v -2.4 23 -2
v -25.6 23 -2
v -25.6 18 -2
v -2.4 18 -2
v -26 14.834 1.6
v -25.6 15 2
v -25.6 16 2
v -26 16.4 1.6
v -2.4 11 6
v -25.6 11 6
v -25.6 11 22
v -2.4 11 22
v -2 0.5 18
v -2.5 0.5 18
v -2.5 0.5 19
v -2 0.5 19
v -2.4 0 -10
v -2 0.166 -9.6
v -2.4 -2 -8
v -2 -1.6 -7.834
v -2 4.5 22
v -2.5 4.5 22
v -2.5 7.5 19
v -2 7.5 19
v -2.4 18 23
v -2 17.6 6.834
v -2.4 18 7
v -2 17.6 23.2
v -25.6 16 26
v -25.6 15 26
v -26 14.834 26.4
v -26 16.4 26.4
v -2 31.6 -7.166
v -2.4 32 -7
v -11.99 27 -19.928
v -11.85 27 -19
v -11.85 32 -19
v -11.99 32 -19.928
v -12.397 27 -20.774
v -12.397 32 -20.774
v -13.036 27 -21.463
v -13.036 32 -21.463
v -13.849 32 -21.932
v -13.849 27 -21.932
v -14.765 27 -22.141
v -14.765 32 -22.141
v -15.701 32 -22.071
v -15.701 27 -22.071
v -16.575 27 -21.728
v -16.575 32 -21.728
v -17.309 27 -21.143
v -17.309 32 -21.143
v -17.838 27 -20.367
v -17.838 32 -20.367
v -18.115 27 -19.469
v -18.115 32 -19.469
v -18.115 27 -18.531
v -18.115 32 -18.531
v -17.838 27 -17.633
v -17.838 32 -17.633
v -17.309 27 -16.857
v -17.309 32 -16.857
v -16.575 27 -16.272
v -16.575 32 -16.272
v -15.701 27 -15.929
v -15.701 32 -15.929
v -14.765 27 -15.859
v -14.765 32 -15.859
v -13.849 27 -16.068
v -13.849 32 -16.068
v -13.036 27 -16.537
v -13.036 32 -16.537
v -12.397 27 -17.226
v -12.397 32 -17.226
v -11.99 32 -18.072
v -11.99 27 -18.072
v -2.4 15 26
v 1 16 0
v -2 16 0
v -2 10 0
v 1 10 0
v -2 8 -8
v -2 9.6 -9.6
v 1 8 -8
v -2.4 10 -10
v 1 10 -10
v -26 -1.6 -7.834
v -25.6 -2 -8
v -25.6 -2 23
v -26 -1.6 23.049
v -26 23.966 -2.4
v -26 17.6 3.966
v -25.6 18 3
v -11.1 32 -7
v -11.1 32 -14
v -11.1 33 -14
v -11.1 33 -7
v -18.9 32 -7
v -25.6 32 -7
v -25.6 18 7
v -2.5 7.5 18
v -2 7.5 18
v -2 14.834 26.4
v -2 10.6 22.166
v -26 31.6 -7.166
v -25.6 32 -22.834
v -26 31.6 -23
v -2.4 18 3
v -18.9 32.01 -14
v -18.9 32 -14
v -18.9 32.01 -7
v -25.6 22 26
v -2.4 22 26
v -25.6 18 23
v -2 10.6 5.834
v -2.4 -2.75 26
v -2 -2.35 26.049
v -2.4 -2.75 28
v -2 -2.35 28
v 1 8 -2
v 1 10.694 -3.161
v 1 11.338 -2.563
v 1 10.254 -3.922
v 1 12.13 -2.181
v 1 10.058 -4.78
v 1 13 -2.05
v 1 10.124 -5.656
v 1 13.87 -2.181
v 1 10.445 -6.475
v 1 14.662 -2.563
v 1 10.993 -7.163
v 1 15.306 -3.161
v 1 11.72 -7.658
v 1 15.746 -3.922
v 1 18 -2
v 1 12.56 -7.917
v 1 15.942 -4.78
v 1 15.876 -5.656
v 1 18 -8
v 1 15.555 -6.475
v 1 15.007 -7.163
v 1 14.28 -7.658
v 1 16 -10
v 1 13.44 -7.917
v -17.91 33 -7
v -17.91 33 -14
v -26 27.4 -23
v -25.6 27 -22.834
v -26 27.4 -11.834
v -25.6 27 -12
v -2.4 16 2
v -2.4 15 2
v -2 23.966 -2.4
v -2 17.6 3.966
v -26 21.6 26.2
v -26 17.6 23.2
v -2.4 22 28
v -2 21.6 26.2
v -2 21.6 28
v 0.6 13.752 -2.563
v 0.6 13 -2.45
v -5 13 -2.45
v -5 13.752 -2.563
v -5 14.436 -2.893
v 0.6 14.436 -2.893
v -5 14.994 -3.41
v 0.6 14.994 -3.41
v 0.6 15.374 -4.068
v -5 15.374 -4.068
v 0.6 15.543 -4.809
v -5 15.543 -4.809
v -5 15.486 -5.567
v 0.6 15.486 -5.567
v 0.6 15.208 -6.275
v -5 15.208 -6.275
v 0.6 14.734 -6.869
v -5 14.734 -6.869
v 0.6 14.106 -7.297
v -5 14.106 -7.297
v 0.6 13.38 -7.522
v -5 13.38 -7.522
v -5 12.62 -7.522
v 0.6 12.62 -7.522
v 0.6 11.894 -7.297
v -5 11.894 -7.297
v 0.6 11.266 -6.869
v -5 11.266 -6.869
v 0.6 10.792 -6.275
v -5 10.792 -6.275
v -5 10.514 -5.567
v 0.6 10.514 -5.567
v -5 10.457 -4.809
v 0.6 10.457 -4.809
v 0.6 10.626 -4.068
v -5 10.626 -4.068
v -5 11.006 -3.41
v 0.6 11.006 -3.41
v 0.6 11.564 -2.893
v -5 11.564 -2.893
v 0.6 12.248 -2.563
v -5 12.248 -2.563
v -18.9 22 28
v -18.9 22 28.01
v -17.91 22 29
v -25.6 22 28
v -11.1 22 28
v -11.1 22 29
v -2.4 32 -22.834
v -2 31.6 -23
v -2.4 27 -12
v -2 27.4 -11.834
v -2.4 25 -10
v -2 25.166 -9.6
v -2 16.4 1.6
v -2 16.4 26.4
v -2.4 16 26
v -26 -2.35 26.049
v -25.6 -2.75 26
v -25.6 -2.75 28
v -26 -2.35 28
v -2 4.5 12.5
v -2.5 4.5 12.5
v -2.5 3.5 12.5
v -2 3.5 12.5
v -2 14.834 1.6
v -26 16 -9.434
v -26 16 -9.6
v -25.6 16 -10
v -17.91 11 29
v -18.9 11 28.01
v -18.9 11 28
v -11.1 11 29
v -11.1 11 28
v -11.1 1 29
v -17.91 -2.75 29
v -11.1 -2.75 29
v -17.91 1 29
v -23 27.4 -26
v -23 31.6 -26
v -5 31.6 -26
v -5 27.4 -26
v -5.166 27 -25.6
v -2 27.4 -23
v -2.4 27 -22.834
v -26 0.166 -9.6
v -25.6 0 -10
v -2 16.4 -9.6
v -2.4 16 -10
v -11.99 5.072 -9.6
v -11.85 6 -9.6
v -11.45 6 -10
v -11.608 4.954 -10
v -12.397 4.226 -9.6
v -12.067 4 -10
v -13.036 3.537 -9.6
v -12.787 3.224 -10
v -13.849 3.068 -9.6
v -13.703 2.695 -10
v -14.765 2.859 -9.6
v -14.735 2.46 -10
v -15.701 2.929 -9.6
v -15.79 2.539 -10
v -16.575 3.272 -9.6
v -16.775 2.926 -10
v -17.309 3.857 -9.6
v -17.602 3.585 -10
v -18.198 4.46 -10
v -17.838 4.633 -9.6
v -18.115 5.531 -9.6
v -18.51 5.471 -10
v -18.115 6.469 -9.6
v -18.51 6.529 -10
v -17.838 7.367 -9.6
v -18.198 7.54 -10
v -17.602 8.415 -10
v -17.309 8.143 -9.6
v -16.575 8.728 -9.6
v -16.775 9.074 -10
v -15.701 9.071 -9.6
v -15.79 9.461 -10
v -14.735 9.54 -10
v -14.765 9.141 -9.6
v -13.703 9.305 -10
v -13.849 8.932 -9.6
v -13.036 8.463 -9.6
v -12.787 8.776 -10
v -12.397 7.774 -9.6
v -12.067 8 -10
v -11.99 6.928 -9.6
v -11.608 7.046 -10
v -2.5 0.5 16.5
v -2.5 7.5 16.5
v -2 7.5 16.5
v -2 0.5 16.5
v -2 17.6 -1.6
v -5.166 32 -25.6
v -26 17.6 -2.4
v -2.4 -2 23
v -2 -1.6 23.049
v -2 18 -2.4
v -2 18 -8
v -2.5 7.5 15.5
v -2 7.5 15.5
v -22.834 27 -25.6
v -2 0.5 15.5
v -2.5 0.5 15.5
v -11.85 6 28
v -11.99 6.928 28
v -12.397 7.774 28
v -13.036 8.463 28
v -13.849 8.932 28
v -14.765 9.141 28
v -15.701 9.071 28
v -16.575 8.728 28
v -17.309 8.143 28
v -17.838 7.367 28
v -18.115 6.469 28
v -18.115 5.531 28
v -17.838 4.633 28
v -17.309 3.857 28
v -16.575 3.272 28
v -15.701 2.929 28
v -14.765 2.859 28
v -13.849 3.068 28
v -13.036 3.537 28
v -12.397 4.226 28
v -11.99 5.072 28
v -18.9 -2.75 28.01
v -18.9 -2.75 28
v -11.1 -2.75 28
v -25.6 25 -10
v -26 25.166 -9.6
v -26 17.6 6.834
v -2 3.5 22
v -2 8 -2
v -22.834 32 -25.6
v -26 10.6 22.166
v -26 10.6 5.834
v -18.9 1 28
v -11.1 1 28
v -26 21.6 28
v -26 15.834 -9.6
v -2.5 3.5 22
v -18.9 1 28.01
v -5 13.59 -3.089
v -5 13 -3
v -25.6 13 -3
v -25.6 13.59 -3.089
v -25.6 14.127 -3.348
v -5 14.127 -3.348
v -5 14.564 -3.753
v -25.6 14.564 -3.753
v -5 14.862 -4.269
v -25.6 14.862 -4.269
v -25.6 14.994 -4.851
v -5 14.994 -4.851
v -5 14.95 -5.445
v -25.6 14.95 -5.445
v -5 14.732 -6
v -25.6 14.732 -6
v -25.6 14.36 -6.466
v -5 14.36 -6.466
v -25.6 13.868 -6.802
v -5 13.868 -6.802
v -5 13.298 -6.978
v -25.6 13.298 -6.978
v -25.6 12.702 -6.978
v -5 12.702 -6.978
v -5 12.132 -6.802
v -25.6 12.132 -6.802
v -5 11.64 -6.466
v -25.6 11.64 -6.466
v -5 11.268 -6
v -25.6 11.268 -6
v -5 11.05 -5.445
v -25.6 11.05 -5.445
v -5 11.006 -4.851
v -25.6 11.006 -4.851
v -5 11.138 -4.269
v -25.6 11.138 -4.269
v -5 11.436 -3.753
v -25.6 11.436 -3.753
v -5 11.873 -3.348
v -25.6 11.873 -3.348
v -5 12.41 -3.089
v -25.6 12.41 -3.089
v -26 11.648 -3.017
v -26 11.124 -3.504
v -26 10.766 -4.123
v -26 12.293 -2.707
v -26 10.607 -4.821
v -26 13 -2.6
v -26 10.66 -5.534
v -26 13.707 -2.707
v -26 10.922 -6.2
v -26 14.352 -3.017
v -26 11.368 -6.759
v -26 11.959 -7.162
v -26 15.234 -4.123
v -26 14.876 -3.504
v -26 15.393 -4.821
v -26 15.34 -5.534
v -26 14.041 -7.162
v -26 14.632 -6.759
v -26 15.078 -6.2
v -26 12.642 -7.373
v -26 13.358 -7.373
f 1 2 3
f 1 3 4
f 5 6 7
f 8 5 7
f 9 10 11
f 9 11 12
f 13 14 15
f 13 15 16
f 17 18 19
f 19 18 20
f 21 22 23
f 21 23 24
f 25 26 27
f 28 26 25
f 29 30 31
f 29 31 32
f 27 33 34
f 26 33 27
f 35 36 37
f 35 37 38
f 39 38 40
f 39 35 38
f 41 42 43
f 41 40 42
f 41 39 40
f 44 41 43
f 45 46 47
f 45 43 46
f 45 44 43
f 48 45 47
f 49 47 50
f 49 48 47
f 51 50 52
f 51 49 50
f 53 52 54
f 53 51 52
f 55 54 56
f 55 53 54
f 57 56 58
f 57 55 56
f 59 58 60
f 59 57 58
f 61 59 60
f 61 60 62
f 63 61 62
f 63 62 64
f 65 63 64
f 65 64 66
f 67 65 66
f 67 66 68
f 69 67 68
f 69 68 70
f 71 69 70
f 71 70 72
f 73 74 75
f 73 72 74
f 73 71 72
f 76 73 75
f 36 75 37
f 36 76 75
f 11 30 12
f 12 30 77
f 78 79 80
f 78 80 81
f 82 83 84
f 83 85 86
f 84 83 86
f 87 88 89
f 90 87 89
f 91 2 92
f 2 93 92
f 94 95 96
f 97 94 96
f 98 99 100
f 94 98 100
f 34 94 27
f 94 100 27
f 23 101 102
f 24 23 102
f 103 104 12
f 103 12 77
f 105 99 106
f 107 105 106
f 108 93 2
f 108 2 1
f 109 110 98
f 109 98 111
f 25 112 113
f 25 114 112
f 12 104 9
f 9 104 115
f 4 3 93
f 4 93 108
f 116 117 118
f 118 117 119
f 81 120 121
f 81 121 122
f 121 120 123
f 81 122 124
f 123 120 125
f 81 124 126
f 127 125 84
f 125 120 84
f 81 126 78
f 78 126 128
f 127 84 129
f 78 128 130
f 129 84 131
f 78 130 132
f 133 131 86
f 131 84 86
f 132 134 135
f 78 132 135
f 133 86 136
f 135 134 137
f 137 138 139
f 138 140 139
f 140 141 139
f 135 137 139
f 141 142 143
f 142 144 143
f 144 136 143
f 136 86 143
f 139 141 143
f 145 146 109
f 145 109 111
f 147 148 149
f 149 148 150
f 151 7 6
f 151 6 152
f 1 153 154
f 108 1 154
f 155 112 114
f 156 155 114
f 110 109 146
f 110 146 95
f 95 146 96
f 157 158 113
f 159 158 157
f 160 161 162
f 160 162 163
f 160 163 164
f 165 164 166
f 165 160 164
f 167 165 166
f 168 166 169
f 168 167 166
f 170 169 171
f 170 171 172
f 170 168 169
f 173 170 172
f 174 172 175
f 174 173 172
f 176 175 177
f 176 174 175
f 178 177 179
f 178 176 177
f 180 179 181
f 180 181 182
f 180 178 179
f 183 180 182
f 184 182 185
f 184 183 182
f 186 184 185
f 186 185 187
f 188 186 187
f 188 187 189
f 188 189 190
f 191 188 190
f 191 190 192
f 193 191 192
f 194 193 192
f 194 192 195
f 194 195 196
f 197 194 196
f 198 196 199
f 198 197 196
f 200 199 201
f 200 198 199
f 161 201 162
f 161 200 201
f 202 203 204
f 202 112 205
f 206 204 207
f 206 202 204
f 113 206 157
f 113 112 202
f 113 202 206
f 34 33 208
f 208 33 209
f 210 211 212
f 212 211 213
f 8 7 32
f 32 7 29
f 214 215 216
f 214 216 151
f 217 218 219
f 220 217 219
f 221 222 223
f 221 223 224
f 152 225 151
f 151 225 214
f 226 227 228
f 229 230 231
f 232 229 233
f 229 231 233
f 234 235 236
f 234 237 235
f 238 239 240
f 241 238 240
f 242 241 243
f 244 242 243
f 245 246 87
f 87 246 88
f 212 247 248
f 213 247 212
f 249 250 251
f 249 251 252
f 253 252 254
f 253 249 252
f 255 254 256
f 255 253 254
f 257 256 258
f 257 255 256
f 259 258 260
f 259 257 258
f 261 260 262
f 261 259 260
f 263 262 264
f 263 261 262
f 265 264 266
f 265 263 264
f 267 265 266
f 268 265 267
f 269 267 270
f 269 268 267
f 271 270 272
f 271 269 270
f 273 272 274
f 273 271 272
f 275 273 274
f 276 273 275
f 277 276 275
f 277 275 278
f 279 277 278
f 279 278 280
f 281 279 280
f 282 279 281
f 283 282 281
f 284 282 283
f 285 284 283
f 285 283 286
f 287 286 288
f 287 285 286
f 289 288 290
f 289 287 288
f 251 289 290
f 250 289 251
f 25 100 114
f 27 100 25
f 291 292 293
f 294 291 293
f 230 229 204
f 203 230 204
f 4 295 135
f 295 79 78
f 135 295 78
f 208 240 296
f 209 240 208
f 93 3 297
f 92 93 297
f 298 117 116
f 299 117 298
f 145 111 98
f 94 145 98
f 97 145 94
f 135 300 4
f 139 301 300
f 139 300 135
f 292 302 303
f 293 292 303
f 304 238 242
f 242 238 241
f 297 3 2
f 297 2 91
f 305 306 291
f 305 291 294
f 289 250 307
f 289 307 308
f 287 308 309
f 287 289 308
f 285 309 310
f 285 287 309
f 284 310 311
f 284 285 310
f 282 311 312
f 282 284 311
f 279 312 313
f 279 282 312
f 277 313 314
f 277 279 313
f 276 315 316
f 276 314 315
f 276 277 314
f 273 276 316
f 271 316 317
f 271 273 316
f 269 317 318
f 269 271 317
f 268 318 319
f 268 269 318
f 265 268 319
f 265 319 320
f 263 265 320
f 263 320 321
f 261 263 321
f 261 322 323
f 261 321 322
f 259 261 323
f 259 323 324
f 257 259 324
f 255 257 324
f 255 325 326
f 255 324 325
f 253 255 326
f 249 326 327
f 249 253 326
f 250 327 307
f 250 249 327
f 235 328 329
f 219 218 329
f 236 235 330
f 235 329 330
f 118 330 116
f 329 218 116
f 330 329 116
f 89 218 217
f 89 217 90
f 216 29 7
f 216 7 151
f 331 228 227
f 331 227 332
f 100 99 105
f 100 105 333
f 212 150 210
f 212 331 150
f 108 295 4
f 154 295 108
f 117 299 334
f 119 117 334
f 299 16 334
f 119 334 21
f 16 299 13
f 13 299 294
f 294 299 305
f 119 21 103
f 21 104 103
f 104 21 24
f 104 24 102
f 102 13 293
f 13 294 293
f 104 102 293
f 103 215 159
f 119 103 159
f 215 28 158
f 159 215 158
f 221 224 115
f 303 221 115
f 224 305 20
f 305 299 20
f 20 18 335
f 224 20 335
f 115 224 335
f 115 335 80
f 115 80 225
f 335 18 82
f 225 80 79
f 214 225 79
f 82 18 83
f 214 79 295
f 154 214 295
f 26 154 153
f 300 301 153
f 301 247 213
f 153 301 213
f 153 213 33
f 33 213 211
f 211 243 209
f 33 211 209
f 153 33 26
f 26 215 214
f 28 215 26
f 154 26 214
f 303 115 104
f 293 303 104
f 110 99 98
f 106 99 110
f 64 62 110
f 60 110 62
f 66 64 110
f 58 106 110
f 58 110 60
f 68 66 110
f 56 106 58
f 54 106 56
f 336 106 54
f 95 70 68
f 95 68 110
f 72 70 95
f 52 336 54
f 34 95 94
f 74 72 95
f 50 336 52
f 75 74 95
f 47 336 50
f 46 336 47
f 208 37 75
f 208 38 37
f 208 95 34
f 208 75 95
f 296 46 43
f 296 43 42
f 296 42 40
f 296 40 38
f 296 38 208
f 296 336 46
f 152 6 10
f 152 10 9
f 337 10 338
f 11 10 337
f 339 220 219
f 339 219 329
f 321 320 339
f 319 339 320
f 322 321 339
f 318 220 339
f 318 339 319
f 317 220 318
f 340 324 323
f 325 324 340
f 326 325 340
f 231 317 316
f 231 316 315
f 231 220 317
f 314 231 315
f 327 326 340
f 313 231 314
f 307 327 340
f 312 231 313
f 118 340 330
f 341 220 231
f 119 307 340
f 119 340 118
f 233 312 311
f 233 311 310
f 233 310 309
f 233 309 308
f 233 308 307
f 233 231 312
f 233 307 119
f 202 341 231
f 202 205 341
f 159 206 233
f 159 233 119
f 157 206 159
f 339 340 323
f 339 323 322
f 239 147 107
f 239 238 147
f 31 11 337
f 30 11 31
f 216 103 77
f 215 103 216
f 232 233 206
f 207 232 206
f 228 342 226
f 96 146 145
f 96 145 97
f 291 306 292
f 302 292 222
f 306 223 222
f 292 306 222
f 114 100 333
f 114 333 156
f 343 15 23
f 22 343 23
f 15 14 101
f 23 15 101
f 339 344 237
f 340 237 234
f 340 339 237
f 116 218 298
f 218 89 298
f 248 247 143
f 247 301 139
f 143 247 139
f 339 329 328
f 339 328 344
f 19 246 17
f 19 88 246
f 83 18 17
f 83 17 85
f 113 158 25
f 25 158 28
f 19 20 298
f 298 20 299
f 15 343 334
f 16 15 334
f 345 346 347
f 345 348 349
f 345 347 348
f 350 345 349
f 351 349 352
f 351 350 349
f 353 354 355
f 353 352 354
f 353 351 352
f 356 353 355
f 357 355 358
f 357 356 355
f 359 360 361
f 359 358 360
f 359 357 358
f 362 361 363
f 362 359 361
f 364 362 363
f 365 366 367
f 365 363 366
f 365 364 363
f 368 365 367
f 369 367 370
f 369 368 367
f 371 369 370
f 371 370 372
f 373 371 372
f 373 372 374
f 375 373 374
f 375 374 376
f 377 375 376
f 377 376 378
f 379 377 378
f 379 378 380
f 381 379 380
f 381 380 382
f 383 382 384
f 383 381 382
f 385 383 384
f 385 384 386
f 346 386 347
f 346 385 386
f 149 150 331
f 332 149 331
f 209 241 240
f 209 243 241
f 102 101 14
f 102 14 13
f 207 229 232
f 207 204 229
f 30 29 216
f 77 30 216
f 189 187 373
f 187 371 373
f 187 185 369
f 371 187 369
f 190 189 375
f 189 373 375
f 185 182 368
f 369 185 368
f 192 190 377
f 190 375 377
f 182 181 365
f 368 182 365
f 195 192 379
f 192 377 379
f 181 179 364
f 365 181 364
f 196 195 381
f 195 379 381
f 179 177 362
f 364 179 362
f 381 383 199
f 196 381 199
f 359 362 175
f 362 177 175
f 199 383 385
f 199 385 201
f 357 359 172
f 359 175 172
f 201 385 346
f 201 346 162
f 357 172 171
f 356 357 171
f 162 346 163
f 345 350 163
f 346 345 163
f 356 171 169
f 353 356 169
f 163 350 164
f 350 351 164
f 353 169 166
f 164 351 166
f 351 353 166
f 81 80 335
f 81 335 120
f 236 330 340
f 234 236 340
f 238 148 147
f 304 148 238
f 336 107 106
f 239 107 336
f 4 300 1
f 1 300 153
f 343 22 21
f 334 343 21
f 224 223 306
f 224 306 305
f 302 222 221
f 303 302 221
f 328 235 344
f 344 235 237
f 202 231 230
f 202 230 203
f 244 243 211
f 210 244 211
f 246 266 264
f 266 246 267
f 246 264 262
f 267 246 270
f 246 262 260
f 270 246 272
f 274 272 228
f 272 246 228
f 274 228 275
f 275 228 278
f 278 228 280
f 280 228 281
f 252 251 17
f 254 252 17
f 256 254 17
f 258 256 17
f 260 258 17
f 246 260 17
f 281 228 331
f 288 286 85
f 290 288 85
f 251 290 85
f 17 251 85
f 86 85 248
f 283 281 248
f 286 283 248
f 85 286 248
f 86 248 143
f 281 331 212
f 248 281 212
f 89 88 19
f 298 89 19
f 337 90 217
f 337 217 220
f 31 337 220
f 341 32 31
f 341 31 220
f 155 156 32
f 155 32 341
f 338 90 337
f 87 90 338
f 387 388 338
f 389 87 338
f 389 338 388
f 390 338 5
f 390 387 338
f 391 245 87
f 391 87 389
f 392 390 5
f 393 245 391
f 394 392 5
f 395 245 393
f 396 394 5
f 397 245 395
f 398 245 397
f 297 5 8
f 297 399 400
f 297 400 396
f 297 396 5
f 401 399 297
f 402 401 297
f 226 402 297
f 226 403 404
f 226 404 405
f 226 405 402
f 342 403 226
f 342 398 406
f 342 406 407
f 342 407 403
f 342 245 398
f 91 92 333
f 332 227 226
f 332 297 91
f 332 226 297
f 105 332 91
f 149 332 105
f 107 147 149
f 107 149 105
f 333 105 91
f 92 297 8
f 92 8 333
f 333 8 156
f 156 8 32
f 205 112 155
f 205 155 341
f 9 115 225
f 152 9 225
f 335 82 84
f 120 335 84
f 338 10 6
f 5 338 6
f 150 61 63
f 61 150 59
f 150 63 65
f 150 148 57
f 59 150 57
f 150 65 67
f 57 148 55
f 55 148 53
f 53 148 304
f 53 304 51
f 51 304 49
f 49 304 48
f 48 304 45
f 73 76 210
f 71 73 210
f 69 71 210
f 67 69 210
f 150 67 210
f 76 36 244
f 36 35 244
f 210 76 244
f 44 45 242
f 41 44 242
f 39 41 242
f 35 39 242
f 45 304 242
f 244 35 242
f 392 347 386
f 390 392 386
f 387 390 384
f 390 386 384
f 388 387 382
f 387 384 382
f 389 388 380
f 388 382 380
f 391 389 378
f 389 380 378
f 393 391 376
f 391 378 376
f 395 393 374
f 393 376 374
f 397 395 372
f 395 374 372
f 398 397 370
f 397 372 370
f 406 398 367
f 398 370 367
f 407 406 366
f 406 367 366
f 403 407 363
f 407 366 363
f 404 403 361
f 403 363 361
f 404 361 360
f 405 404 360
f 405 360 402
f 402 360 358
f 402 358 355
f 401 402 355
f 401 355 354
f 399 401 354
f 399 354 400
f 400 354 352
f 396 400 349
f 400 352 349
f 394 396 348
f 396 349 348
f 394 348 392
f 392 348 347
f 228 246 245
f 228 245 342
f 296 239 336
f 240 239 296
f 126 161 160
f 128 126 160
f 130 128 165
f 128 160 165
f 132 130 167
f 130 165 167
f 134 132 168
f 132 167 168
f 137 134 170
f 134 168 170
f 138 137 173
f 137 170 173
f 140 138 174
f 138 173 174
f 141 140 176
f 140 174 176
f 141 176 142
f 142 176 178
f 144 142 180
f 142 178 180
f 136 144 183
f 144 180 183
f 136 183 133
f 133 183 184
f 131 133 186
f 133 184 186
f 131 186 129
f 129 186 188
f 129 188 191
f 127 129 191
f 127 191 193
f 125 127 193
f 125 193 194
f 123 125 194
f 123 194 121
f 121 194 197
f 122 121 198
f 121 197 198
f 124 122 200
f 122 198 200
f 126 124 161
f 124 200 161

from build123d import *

# Parameters (mm, degrees)
CYLINDER018_R                = 3.15
CYLINDER018_DEPTH            = 10
BOX035_W                     = 24
BOX035_H                     = 5
BOX035_DEPTH                 = 16
BOX034_W                     = 24
BOX034_H                     = 16
BOX034_DEPTH                 = 8
CHAMFER003068012002033_SIZE  = 2
CHAMFER003068012002034_SIZE  = 5
CHAMFER003068012002035_SIZE  = 3
CHAMFER003068012002036_SIZE  = 0.4
CYLINDER016_R                = 3.15
CYLINDER016_DEPTH            = 43
CYLINDER015_R                = 2
CYLINDER015_DEPTH            = 39
CYLINDER017_R                = 2.55
CYLINDER017_DEPTH            = 6
BOX030_W                     = 1
BOX030_H                     = 7
BOX030_DEPTH                 = 4
BOX031_W                     = 1
BOX031_H                     = 7
BOX031_DEPTH                 = 4
CHAMFER003068012002027_SIZE  = 3
BOX025_W                     = 4
BOX025_H                     = 10
BOX025_DEPTH                 = 10
CHAMFER003068012002021_SIZE  = 2
BOX026_W                     = 25
BOX026_H                     = 5
BOX026_DEPTH                 = 24
CHAMFER003068012002018_SIZE  = 4
BOX024_W                     = 24
BOX024_H                     = 20
BOX024_DEPTH                 = 38
CHAMFER003068012002019_SIZE  = 2
CHAMFER003068012002020_SIZE  = 2
BOX032_W                     = 24
BOX032_H                     = 2
BOX032_DEPTH                 = 5
CHAMFER003068012002028_SIZE2 = 0.75
CHAMFER003068012002028_SIZE  = 3
BOX033_W                     = 24
BOX033_H                     = 5
BOX033_DEPTH                 = 5
CHAMFER003068012002029_SIZE2 = 4
CHAMFER003068012002029_SIZE  = 3
BOX027_W                     = 7.8
BOX027_H                     = 11
BOX027_DEPTH                 = 1
BOX028_W                     = 7.8
BOX028_H                     = 3.75
BOX028_DEPTH                 = 1
CHAMFER003068012002030_SIZE  = 0.99
CHAMFER003068012002031_SIZE  = 0.4
CHAMFER003068012002032_SIZE  = 0.4
BOX036_W                     = 7.8
BOX036_H                     = 1
BOX036_DEPTH                 = 7
CHAMFER003068012002037_SIZE  = 0.99
BOX037_W                     = 24
BOX037_H                     = 10
BOX037_DEPTH                 = 10
CHAMFER003068012002039_SIZE  = 9
BOX038_W                     = 24
BOX038_H                     = 10
BOX038_DEPTH                 = 10
CHAMFER003068012002038_SIZE  = 9
CHAMFER003068012002040_SIZE  = 0.4


with BuildPart() as cylinder018:
    # Cylinder018 → Cylinder018 (new body)
    with BuildSketch(Plane(origin=(-15, 25, -19), x_dir=(1, 0, 0), z_dir=(0, 1, 0))):
        Circle(CYLINDER018_R)
    extrude(amount=CYLINDER018_DEPTH)


with BuildPart() as cube035:
    # Box035 → Box035 (new body)
    with BuildSketch(Plane(origin=(-26, 27, -26), x_dir=(1, 0, 0), z_dir=(0, 0, 1))):
        with Locations((12, 2.5)):
            Rectangle(BOX035_W, BOX035_H)
    extrude(amount=BOX035_DEPTH)


with BuildPart() as chamfer003068012002036:
    # Box034 → Box034 (new body)
    with BuildSketch(Plane(origin=(-26, 16, -10), x_dir=(1, 0, 0), z_dir=(0, 0, 1))):
        with Locations((12, 8)):
            Rectangle(BOX034_W, BOX034_H)
    extrude(amount=BOX034_DEPTH)

    # Fusion001002012017: union Cube035
    add(cube035.part)

    # Cut001019: cut Cylinder018
    add(cylinder018.part, mode=Mode.SUBTRACT)

    # Chamfer003068012002033
    chamfer003068012002033_edges = [chamfer003068012002036.edges().sort_by_distance(p)[0] for p in [
        (-14, 27, -10),
    ]]
    chamfer(chamfer003068012002033_edges, length=CHAMFER003068012002033_SIZE)

    # Chamfer003068012002034
    chamfer003068012002034_edges = [chamfer003068012002036.edges().sort_by_distance(p)[0] for p in [
        (-14, 32, -2),
    ]]
    chamfer(chamfer003068012002034_edges, length=CHAMFER003068012002034_SIZE)

    # Chamfer003068012002035
    chamfer003068012002035_edges = [chamfer003068012002036.edges().sort_by_distance(p)[0] for p in [
        (-26, 29.5, -26),
        (-2, 29.5, -26),
    ]]
    chamfer(chamfer003068012002035_edges, length=CHAMFER003068012002035_SIZE)

    # Chamfer003068012002036
    chamfer003068012002036_edges = [chamfer003068012002036.edges().sort_by_distance(p)[0] for p in [
        (-26, 32, -15),
        (-26, 27, -17.5),
        (-26, 26, -11),
        (-26, 20.5, -10),
        (-26, 21.5, -2),
        (-26, 29.5, -4.5),
        (-2, 32, -15),
        (-3.5, 32, -24.5),
        (-14, 32, -26),
        (-24.5, 32, -24.5),
        (-24.5, 27, -24.5),
        (-2, 29.5, -4.5),
        (-2, 27, -17.5),
        (-3.5, 27, -24.5),
        (-14, 27, -26),
        (-2, 21.5, -2),
        (-2, 26, -11),
        (-2, 20.5, -10),
    ]]
    chamfer(chamfer003068012002036_edges, length=CHAMFER003068012002036_SIZE)


with BuildPart() as cylinder016:
    # Cylinder016 → Cylinder016 (new body)
    with BuildSketch(Plane(origin=(-15, 6, -11), x_dir=(1, 0, 0), z_dir=(0, 0, 1))):
        Circle(CYLINDER016_R)
    extrude(amount=CYLINDER016_DEPTH)


with BuildPart() as cylinder015:
    # Cylinder015 → Cylinder015 (new body)
    with BuildSketch(Plane(origin=(1, 13, -5), x_dir=(0, 0, 1), z_dir=(-1, 0, 0))):
        Circle(CYLINDER015_R)
    extrude(amount=CYLINDER015_DEPTH)


with BuildPart() as fusion001002012010:
    # Cylinder017 → Cylinder017 (new body)
    with BuildSketch(Plane(origin=(1, 13, -5), x_dir=(0, 0, 1), z_dir=(-1, 0, 0))):
        Circle(CYLINDER017_R)
    extrude(amount=CYLINDER017_DEPTH)

    # Fusion001002012010: union Cylinder015
    add(cylinder015.part)


with BuildPart() as cube030:
    # Box030 → Box030 (new body)
    with BuildSketch(Plane(origin=(-2.5, 0.5, 16.5), x_dir=(1, 0, 0), z_dir=(0, 0, 1))):
        with Locations((0.5, 3.5)):
            Rectangle(BOX030_W, BOX030_H)
    extrude(amount=BOX030_DEPTH)


with BuildPart() as chamfer003068012002027:
    # Box031 → Box031 (new body)
    with BuildSketch(Plane(origin=(-2.5, 0.5, 11), x_dir=(1, 0, 0), z_dir=(0, 0, 1))):
        with Locations((0.5, 3.5)):
            Rectangle(BOX031_W, BOX031_H)
    extrude(amount=BOX031_DEPTH)

    # Fusion001002012012: union Cube030
    add(cube030.part)

    # Chamfer003068012002027
    chamfer003068012002027_edges = [chamfer003068012002027.edges().sort_by_distance(p)[0] for p in [
        (-2, 0.5, 11),
        (-2, 7.5, 11),
        (-2, 0.5, 20.5),
        (-2, 7.5, 20.5),
    ]]
    chamfer(chamfer003068012002027_edges, length=CHAMFER003068012002027_SIZE)


with BuildPart() as chamfer003068012002027_1:
    # Chamfer003068012002027 placement: moved
    add(chamfer003068012002027.part.moved(Location((0, 0, 1.5))))


with BuildPart() as chamfer003068012002021:
    # Box025 → Box025 (new body)
    with BuildSketch(Plane(origin=(-3, 8, -10), x_dir=(1, 0, 0), z_dir=(0, 0, 1))):
        with Locations((2, 5)):
            Rectangle(BOX025_W, BOX025_H)
    extrude(amount=BOX025_DEPTH)

    # Chamfer003068012002021
    chamfer003068012002021_edges = [chamfer003068012002021.edges().sort_by_distance(p)[0] for p in [
        (-1, 8, -10),
        (-1, 8, 0),
        (-1, 18, -10),
        (-1, 18, 0),
    ]]
    chamfer(chamfer003068012002021_edges, length=CHAMFER003068012002021_SIZE)


with BuildPart() as chamfer003068012002018:
    # Box026 → Box026 (new body)
    with BuildSketch(Plane(origin=(-26, 11, 2), x_dir=(1, 0, 0), z_dir=(0, 0, 1))):
        with Locations((12.5, 2.5)):
            Rectangle(BOX026_W, BOX026_H)
    extrude(amount=BOX026_DEPTH)

    # Chamfer003068012002018
    chamfer003068012002018_edges = [chamfer003068012002018.edges().sort_by_distance(p)[0] for p in [
        (-13.5, 11, 2),
        (-13.5, 11, 26),
    ]]
    chamfer(chamfer003068012002018_edges, length=CHAMFER003068012002018_SIZE)


with BuildPart() as chamfer003068012002020:
    # Box024 → Box024 (new body)
    with BuildSketch(Plane(origin=(-26, -2, -10), x_dir=(1, 0, 0), z_dir=(0, 0, 1))):
        with Locations((12, 10)):
            Rectangle(BOX024_W, BOX024_H)
    extrude(amount=BOX024_DEPTH)

    # Cut001015: cut Chamfer003068012002018
    add(chamfer003068012002018.part, mode=Mode.SUBTRACT)

    # Chamfer003068012002019
    chamfer003068012002019_edges = [chamfer003068012002020.edges().sort_by_distance(p)[0] for p in [
        (-14, 18, -10),
    ]]
    chamfer(chamfer003068012002019_edges, length=CHAMFER003068012002019_SIZE)

    # Chamfer003068012002020
    chamfer003068012002020_edges = [chamfer003068012002020.edges().sort_by_distance(p)[0] for p in [
        (-14, -2, -10),
    ]]
    chamfer(chamfer003068012002020_edges, length=CHAMFER003068012002020_SIZE)


with BuildPart() as chamfer003068012002028:
    # Box032 → Box032 (new body)
    with BuildSketch(Plane(origin=(-26, -2.75, 23), x_dir=(1, 0, 0), z_dir=(0, 0, 1))):
        with Locations((12, 1)):
            Rectangle(BOX032_W, BOX032_H)
    extrude(amount=BOX032_DEPTH)

    # Chamfer003068012002028
    chamfer003068012002028_edges = [chamfer003068012002028.edges().sort_by_distance(p)[0] for p in [
        (-14, -2.75, 23),
    ]]
    chamfer003068012002028_side = chamfer003068012002028.faces().sort_by_distance((-14, -2.75, 25.5))[0]
    chamfer(chamfer003068012002028_edges, length=CHAMFER003068012002028_SIZE, length2=CHAMFER003068012002028_SIZE2, reference=chamfer003068012002028_side)


with BuildPart() as fusion001002012013:
    # Box033 → Box033 (new body)
    with BuildSketch(Plane(origin=(-26, 17, 23), x_dir=(1, 0, 0), z_dir=(0, 0, 1))):
        with Locations((12, 2.5)):
            Rectangle(BOX033_W, BOX033_H)
    extrude(amount=BOX033_DEPTH)

    # Chamfer003068012002029
    chamfer003068012002029_edges = [fusion001002012013.edges().sort_by_distance(p)[0] for p in [
        (-14, 22, 23),
    ]]
    chamfer003068012002029_side = fusion001002012013.faces().sort_by_distance((-14, 22, 25.5))[0]
    chamfer(chamfer003068012002029_edges, length=CHAMFER003068012002029_SIZE, length2=CHAMFER003068012002029_SIZE2, reference=chamfer003068012002029_side)

    # Fusion001002012013: union Chamfer003068012002020, Chamfer003068012002028
    add(chamfer003068012002020.part)
    add(chamfer003068012002028.part)


with BuildPart() as cube027:
    # Box027 → Box027 (new body)
    with BuildSketch(Plane(origin=(-18.9, 11, 28), x_dir=(1, 0, 0), z_dir=(0, 0, 1))):
        with Locations((3.9, 5.5)):
            Rectangle(BOX027_W, BOX027_H)
    extrude(amount=BOX027_DEPTH)


with BuildPart() as fusion001002012018:
    # Box028 → Box028 (new body)
    with BuildSketch(Plane(origin=(-18.9, -2.75, 28), x_dir=(1, 0, 0), z_dir=(0, 0, 1))):
        with Locations((3.9, 1.875)):
            Rectangle(BOX028_W, BOX028_H)
    extrude(amount=BOX028_DEPTH)

    # Fusion001002012014: union Cube027
    add(cube027.part)

    # Chamfer003068012002030
    chamfer003068012002030_edges = [fusion001002012018.edges().sort_by_distance(p)[0] for p in [
        (-18.9, -0.875, 29),
        (-18.9, 16.5, 29),
    ]]
    chamfer(chamfer003068012002030_edges, length=CHAMFER003068012002030_SIZE)

    # Fusion001002012015: union Fusion001002012013
    add(fusion001002012013.part)

    # Chamfer003068012002031
    chamfer003068012002031_edges = [fusion001002012018.edges().sort_by_distance(p)[0] for p in [
        (-26, -2.75, 27),
        (-2, -2.75, 27),
        (-26, -2.375, 24.5),
        (-2, -2.375, 24.5),
        (-2, -2, 7.5),
        (-26, -2, 7.5),
        (-26, -1, -9),
        (-2, -1, -9),
        (-26, 8, -10),
        (-2, 8, -10),
        (-2, 18, 7.5),
        (-26, 18, 7.5),
        (-26, 17, -9),
        (-2, 17, -9),
        (-26, 20, 24.5),
        (-2, 20, 24.5),
        (-26, 22, 27),
        (-26, 13, 4),
        (-26, 15.5, 2),
        (-26, 16, 14),
        (-26, 15.5, 26),
        (-26, 13, 24),
        (-26, 11, 14),
        (-2, 13, 4),
        (-2, 11, 14),
        (-2, 15.5, 2),
        (-2, 13, 24),
        (-2, 16, 14),
        (-2, 15.5, 26),
        (-2, 22, 27),
    ]]
    chamfer(chamfer003068012002031_edges, length=CHAMFER003068012002031_SIZE)

    # Fusion001002012016: union Chamfer003068012002021
    add(chamfer003068012002021.part)

    # Cut001016: cut Chamfer003068012002027
    add(chamfer003068012002027_1.part, mode=Mode.SUBTRACT)

    # Cut001017: cut Fusion001002012010
    add(fusion001002012010.part, mode=Mode.SUBTRACT)

    # Cut001018: cut Cylinder016
    add(cylinder016.part, mode=Mode.SUBTRACT)

    # Chamfer003068012002032
    chamfer003068012002032_edges = [fusion001002012018.edges().sort_by_distance(p)[0] for p in [
        (-26, 13, -7),
        (-18.15, 6, -10),
        (1, 13, -7.55),
    ]]
    chamfer(chamfer003068012002032_edges, length=CHAMFER003068012002032_SIZE)

    # Fusion001002012018: union Chamfer003068012002036
    add(chamfer003068012002036.part)


with BuildPart() as fusion001002012019:
    # Box036 → Box036 (new body)
    with BuildSketch(Plane(origin=(-18.9, 32, -14), x_dir=(1, 0, 0), z_dir=(0, 0, 1))):
        with Locations((3.9, 0.5)):
            Rectangle(BOX036_W, BOX036_H)
    extrude(amount=BOX036_DEPTH)

    # Chamfer003068012002037
    chamfer003068012002037_edges = [fusion001002012019.edges().sort_by_distance(p)[0] for p in [
        (-18.9, 33, -10.5),
    ]]
    chamfer(chamfer003068012002037_edges, length=CHAMFER003068012002037_SIZE)

    # Fusion001002012019: union Fusion001002012018
    add(fusion001002012018.part)


with BuildPart() as chamfer003068012002039:
    # Box037 → Box037 (new body)
    with BuildSketch(Plane(origin=(-26, 13, -7), x_dir=(1, 0, 0), z_dir=(0, 0, 1))):
        with Locations((12, 5)):
            Rectangle(BOX037_W, BOX037_H)
    extrude(amount=BOX037_DEPTH)

    # Chamfer003068012002039
    chamfer003068012002039_edges = [chamfer003068012002039.edges().sort_by_distance(p)[0] for p in [
        (-14, 23, 3),
    ]]
    chamfer(chamfer003068012002039_edges, length=CHAMFER003068012002039_SIZE)


with BuildPart() as chamfer003068012002039_1:
    # Chamfer003068012002039 placement: moved
    add(chamfer003068012002039.part.moved(Location((0, 2, 2))))


with BuildPart() as fusion001002012020:
    # Box038 → Box038 (new body)
    with BuildSketch(Plane(origin=(-26, 17, -3), x_dir=(1, 0, 0), z_dir=(0, 0, 1))):
        with Locations((12, 5)):
            Rectangle(BOX038_W, BOX038_H)
    extrude(amount=BOX038_DEPTH)

    # Chamfer003068012002038
    chamfer003068012002038_edges = [fusion001002012020.edges().sort_by_distance(p)[0] for p in [
        (-14, 27, 7),
    ]]
    chamfer(chamfer003068012002038_edges, length=CHAMFER003068012002038_SIZE)

    # Cut001022: cut Chamfer003068012002039
    add(chamfer003068012002039_1.part, mode=Mode.SUBTRACT)

    # Chamfer003068012002040
    chamfer003068012002040_edges = [fusion001002012020.edges().sort_by_distance(p)[0] for p in [
        (-26, 22.5, 2.5),
        (-26, 25.5, -3),
        (-26, 20.5, 0.5),
        (-26, 17, 5.5),
        (-2, 22.5, 2.5),
        (-2, 25.5, -3),
        (-2, 20.5, 0.5),
        (-2, 17, 5.5),
    ]]
    chamfer(chamfer003068012002040_edges, length=CHAMFER003068012002040_SIZE)

    # Fusion001002012020: union Fusion001002012019
    add(fusion001002012019.part)


solid = fusion001002012020.part
